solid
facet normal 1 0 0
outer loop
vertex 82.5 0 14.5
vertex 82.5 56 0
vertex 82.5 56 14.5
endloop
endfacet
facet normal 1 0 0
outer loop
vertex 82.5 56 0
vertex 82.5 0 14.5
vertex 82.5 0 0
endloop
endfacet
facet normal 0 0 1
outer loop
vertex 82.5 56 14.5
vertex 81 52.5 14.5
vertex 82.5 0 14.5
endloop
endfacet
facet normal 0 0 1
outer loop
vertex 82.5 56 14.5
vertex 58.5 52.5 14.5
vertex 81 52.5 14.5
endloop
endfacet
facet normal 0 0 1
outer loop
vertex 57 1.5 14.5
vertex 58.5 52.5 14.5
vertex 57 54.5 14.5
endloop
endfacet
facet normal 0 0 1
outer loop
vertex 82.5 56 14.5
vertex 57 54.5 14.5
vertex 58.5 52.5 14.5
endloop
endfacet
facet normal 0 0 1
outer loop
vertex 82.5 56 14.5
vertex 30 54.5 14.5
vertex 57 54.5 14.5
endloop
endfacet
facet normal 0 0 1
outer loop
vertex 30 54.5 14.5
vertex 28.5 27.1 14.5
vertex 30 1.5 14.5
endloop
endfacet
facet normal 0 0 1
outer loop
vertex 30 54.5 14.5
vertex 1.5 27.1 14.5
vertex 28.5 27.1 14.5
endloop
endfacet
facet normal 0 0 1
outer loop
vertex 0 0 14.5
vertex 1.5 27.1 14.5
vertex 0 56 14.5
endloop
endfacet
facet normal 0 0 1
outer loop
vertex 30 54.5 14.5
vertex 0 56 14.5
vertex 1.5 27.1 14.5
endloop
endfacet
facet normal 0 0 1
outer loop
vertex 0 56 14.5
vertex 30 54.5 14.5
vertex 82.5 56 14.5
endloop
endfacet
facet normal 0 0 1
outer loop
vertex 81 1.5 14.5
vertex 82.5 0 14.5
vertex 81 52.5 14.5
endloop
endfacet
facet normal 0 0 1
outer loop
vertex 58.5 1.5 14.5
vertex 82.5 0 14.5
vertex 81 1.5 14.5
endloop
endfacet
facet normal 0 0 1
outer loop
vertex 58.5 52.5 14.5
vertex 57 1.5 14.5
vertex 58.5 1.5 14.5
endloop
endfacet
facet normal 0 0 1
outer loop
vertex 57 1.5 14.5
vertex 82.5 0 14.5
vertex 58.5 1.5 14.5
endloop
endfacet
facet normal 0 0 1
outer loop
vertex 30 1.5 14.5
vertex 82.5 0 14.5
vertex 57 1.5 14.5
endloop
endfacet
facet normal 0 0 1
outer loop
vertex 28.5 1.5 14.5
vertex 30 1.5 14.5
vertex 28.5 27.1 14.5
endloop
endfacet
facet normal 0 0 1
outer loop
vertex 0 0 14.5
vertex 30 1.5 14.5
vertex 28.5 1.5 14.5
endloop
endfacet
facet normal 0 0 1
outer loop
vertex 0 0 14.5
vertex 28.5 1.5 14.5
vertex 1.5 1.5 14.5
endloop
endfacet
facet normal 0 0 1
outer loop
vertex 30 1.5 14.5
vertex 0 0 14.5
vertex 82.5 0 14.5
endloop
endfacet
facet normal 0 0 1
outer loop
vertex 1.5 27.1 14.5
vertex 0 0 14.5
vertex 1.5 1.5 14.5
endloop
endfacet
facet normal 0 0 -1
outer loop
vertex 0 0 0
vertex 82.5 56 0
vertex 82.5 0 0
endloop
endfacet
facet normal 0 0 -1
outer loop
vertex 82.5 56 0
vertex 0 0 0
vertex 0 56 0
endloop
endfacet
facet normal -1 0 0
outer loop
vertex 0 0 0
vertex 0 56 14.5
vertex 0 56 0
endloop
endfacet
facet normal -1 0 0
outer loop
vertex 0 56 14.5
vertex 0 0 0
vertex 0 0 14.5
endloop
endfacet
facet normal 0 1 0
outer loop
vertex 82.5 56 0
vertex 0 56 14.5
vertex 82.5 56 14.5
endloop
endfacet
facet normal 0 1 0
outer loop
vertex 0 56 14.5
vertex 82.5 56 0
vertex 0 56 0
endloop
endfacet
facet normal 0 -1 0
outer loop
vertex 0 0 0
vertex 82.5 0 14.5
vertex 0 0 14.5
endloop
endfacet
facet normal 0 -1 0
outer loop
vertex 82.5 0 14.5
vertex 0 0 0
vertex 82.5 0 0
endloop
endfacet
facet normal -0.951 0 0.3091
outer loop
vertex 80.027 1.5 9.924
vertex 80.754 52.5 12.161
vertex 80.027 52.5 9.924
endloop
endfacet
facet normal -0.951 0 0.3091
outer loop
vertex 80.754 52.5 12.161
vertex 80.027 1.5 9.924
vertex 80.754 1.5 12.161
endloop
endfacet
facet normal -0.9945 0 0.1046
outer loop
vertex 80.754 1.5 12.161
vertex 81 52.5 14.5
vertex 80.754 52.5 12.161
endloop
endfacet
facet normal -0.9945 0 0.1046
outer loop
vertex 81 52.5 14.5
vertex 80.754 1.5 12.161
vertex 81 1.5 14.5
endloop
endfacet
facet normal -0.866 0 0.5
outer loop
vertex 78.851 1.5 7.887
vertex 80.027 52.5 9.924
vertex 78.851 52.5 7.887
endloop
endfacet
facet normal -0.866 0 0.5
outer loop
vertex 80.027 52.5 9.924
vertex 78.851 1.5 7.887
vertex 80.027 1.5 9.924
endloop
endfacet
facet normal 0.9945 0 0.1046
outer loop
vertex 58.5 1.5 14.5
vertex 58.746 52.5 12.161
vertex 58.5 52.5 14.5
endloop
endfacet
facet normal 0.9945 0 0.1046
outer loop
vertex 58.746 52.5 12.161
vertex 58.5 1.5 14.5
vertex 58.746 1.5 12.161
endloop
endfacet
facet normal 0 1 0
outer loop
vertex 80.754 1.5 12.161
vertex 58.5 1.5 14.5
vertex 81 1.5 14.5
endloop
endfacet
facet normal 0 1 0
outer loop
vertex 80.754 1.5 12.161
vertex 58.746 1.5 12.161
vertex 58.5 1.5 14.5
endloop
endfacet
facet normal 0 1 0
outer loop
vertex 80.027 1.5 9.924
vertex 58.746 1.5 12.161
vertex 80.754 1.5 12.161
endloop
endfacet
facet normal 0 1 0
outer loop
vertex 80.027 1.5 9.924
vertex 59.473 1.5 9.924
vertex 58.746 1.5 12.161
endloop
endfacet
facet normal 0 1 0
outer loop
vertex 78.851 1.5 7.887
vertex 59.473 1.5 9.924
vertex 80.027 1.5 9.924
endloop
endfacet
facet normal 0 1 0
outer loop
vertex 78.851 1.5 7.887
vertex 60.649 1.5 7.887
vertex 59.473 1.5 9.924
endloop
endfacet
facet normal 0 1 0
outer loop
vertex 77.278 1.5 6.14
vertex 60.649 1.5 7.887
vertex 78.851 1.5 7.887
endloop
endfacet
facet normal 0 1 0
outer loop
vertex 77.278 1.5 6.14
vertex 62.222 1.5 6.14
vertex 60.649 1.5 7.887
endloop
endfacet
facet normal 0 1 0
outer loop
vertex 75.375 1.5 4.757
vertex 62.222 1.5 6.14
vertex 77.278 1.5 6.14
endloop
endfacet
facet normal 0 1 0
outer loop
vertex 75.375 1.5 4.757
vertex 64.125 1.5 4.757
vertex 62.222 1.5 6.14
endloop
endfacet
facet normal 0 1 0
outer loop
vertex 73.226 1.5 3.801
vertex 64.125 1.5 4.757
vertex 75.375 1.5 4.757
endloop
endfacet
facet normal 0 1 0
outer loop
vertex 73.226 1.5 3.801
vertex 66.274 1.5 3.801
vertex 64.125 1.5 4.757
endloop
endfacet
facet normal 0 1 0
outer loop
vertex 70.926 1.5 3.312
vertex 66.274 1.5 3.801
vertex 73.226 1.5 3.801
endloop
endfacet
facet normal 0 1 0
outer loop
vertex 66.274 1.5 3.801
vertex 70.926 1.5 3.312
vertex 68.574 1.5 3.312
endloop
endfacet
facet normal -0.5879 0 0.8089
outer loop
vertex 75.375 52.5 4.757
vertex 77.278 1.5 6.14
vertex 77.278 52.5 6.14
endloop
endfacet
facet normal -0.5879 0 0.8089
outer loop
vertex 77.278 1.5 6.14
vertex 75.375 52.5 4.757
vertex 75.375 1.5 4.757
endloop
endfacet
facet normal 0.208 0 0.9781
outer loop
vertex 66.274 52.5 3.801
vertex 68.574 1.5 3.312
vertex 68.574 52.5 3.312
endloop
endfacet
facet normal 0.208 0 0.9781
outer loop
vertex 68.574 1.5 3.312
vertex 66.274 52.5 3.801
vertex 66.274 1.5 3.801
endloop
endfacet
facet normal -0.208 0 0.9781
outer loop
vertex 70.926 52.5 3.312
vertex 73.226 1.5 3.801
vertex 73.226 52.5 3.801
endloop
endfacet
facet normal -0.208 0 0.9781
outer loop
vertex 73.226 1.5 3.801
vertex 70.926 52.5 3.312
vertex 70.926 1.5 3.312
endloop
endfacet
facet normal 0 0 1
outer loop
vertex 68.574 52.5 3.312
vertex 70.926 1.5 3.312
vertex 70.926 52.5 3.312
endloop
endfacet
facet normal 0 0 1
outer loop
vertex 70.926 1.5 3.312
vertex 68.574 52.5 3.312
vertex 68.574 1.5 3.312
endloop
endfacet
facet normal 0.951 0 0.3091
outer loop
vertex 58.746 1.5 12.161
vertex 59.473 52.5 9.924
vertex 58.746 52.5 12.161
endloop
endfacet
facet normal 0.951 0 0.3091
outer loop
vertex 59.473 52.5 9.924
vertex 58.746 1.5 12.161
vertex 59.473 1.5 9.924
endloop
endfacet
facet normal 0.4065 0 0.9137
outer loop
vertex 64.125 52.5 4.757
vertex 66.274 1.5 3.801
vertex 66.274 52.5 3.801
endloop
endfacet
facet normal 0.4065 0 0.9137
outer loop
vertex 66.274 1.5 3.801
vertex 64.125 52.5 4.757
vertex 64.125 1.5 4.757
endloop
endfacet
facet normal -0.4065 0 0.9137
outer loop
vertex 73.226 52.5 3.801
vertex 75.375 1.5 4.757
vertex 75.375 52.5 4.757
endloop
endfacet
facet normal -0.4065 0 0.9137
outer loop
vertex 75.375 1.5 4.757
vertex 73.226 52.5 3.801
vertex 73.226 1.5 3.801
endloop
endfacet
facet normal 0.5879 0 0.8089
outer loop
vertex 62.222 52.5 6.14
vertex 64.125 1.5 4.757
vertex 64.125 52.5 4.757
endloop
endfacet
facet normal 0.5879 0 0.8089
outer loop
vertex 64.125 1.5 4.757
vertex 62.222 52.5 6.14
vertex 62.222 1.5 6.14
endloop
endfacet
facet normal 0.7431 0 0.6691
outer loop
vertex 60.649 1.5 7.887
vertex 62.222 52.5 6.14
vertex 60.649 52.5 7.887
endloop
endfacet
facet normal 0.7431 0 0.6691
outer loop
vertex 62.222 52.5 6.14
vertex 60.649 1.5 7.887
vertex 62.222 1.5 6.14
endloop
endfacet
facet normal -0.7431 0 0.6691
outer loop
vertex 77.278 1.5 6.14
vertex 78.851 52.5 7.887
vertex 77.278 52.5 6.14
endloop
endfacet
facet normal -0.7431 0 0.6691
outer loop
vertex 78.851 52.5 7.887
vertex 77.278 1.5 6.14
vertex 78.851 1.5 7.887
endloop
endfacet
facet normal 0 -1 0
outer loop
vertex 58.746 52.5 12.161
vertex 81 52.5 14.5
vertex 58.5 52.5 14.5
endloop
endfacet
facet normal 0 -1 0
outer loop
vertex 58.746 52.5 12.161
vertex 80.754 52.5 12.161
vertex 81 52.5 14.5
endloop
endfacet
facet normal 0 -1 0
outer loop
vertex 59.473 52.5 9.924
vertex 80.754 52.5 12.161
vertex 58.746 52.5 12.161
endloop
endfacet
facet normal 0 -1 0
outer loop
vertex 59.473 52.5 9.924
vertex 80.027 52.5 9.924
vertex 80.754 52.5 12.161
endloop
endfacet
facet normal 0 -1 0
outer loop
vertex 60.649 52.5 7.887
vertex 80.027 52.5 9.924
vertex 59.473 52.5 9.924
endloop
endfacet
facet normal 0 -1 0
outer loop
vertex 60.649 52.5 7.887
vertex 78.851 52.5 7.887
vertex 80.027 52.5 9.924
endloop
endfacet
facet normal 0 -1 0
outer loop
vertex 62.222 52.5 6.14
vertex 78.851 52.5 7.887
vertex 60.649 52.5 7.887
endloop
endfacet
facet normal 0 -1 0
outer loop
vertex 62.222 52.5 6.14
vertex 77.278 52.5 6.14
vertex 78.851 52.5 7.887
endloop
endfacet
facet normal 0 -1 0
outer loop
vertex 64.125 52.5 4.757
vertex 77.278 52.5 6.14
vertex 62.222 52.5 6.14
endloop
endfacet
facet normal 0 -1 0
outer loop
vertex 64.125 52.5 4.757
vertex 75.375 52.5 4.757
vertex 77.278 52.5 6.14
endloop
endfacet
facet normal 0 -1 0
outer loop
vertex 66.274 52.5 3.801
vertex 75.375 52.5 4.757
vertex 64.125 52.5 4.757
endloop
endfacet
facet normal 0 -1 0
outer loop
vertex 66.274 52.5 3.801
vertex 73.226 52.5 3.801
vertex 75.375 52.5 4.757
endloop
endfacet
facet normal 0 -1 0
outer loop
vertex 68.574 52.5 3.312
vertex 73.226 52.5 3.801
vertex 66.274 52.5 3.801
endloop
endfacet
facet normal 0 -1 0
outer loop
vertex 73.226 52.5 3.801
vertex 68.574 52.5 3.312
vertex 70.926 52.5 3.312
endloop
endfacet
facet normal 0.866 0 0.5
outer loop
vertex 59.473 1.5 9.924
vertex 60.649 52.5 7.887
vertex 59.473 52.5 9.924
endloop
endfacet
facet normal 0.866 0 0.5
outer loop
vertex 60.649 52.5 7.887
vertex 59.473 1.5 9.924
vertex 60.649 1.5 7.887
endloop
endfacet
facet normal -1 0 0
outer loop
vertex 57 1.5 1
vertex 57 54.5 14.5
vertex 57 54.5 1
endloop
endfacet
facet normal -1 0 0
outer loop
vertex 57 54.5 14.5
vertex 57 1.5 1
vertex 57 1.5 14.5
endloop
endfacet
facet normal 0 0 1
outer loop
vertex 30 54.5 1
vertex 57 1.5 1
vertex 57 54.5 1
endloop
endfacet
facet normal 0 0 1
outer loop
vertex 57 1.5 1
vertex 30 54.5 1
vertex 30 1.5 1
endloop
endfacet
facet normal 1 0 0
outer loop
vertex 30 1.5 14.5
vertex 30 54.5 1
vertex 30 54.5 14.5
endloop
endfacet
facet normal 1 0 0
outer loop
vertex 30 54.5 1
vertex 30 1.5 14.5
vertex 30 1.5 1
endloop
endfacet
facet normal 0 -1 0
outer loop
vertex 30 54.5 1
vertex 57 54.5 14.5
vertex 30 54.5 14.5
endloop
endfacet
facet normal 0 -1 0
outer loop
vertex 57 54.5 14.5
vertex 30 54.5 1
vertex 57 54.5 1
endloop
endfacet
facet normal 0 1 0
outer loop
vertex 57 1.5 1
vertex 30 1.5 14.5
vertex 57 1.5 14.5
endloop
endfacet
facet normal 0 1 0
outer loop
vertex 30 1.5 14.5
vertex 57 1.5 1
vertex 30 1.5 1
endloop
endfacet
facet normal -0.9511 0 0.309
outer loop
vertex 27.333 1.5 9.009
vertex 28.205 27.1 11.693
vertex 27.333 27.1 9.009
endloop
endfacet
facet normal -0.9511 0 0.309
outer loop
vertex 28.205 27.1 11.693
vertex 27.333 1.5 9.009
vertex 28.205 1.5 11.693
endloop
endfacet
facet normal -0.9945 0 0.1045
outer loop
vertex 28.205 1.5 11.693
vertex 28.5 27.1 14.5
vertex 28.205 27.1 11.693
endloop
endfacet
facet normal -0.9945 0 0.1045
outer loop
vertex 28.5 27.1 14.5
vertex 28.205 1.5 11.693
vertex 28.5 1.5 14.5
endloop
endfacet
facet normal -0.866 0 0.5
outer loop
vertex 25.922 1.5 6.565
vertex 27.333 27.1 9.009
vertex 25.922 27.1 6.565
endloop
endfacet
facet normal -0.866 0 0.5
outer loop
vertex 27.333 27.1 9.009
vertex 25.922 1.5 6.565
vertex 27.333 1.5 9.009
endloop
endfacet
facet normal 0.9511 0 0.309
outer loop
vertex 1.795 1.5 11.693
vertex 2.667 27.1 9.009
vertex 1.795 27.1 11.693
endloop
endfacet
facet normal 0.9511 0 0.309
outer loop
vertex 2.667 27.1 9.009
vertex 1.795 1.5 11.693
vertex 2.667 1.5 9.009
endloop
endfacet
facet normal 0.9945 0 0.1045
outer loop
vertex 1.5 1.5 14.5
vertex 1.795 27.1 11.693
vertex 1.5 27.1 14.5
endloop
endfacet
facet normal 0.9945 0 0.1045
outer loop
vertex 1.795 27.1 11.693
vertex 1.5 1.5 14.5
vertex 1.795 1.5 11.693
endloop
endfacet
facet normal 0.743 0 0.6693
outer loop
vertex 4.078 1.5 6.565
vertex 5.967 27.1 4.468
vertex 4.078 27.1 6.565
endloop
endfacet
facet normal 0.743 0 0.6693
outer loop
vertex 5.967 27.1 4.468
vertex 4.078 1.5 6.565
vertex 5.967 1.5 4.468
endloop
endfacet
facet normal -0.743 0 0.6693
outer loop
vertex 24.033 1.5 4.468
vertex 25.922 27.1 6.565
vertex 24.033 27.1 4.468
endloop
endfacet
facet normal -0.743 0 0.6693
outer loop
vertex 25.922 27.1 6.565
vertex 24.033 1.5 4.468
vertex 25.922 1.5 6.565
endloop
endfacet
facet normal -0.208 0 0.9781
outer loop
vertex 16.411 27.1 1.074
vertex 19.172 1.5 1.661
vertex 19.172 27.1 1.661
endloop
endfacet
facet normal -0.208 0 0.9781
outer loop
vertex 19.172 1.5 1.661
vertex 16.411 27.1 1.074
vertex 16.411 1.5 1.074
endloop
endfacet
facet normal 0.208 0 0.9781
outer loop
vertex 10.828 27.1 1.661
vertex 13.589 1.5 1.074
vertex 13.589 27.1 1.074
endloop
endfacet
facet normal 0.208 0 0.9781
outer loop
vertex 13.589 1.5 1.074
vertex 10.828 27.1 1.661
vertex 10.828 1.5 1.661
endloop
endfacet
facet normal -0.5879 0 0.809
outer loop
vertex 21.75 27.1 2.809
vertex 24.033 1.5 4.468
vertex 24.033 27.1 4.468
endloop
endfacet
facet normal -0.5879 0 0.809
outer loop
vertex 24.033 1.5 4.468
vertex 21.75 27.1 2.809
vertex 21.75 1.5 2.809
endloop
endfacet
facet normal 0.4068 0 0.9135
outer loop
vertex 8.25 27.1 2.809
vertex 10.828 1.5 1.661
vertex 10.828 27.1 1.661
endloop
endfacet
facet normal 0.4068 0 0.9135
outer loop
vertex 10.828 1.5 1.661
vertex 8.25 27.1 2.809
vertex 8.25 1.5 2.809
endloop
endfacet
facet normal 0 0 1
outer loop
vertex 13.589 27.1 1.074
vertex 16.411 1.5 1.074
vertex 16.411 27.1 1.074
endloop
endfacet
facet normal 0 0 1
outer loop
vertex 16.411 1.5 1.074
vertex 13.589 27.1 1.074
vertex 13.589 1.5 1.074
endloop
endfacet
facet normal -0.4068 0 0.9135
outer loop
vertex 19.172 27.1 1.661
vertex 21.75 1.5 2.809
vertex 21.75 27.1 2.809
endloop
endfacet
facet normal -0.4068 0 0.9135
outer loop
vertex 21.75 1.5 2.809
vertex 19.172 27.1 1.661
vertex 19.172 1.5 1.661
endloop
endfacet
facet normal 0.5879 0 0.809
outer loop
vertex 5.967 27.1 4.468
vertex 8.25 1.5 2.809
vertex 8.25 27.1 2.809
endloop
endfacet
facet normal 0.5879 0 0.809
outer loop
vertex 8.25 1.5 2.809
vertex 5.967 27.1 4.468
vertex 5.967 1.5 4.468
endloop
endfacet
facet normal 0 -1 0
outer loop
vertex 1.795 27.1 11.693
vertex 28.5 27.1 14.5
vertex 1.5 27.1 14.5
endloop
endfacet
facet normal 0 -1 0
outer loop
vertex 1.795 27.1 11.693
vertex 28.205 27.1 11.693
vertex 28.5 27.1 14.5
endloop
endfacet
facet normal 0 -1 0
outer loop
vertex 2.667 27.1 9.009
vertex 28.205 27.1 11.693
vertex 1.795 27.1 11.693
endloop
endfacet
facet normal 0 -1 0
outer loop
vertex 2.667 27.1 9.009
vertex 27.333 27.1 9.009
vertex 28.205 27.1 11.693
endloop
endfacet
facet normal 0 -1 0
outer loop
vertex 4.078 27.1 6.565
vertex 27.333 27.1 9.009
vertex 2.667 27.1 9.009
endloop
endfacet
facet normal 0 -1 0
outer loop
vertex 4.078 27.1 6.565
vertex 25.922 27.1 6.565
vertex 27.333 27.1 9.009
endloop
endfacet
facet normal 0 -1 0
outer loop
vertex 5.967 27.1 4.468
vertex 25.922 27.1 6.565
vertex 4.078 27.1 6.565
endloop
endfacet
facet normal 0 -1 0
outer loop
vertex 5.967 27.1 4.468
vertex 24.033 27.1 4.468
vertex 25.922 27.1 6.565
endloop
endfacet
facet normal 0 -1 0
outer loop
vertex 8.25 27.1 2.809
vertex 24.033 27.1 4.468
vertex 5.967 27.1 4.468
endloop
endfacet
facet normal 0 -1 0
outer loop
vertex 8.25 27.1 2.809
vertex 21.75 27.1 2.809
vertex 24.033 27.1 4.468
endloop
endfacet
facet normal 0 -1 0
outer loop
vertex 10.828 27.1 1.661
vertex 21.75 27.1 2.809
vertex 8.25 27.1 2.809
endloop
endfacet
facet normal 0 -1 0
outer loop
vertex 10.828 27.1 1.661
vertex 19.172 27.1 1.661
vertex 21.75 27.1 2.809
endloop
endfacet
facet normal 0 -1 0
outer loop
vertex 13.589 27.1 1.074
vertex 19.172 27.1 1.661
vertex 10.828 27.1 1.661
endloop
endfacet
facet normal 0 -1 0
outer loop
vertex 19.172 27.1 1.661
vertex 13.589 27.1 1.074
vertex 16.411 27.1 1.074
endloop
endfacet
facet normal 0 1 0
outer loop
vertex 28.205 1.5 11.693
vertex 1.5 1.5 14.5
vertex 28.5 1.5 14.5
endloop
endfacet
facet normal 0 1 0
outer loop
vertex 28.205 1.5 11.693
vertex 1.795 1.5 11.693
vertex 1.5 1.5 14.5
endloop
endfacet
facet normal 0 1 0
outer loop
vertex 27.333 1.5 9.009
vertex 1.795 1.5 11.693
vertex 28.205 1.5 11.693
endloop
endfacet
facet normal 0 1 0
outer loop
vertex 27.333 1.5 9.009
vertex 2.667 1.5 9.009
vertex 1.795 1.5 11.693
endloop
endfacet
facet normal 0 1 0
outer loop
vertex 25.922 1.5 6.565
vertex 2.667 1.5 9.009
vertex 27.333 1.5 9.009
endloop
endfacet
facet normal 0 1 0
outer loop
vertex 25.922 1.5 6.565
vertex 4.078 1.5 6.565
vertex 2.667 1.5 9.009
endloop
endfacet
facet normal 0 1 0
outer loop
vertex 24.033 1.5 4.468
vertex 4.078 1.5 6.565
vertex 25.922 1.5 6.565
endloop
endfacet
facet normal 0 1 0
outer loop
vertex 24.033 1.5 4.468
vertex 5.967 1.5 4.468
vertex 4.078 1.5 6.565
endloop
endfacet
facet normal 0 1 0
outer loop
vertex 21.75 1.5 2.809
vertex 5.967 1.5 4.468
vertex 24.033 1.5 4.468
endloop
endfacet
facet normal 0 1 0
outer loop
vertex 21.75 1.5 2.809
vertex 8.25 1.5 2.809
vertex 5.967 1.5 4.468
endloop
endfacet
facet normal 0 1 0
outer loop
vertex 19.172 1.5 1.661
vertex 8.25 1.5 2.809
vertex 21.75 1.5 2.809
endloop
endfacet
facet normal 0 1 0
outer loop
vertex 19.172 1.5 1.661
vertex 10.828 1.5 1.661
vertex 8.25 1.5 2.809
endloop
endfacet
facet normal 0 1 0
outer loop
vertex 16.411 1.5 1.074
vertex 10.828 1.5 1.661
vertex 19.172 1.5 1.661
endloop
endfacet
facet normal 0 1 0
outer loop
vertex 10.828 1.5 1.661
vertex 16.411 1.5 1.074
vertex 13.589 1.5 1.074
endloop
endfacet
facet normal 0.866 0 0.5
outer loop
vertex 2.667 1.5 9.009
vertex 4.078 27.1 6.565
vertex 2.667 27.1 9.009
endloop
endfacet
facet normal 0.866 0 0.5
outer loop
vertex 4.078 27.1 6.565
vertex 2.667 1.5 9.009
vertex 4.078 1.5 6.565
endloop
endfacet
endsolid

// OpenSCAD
// file: consts.scad
$fs = 0.5;

FLOOR = 1;
WALL = 1.5;
THIN_WALL = 0.6;

SQUARE_TILE = 27; // 25.46mm
TILE_THICK = 3; // 2.18

RESOURCE_STACK = 53; // 51.43mm, 32 tokens

CUBE = 9; // 8.6mm

VOTING_TRIANGLE = 29; // 27.44mm
VOTING_STACK = 28; // 26.17, 12 tokens

// Discs
CLAIM_DIA = 13; // 11.83
CLAIM_H = 4; //3.78
CLAIM_STACK = 58; // 55.58

// TOKEN_STACK = 21; // 19.56, 9 tokens
TOKEN_STACK = 14; // 13.02, 6 square tokens

// Cubes
DELIVERY_STACK_D = 58; //55.71
DELIVERY_STACK_W = 18; //16.30
DELIVERY_STACK_H = DELIVERY_STACK_W;

MEEPLE_W = 17; //16.30
MEEPLE_H = 21; //20.23
MEEPLE_STACK = 30.5; //29.01

MONEY_1_DIA = 22.5; //21.22
MONEY_1_STACK = 51; // 49.60
MONEY_3_DIA = 27; //25.64
MONEY_3_STACK = 25.6; //23.97

ROAD_STACK = 53; //51.43

TOKEN_BOX_W = DELIVERY_STACK_W + MEEPLE_W + CLAIM_DIA + WALL * 4;
TOKEN_BOX_D = max(DELIVERY_STACK_D, SQUARE_TILE + WALL + MEEPLE_STACK, CLAIM_STACK) + WALL*2;
TOKEN_BOX_H = DELIVERY_STACK_H + FLOOR - CUBE/2;

BANK_BOX_W = MONEY_1_DIA + MONEY_3_DIA + SQUARE_TILE + WALL*4;
BANK_BOX_D = max(MONEY_1_STACK, MONEY_3_STACK, ROAD_STACK) + WALL*2;
BANK_BOX_H = max(MONEY_1_DIA, MONEY_3_DIA, SQUARE_TILE)/2 + FLOOR;

CARD_W = 65; // 63.42
CARD_H = 91; // 89.37

CARD_STACK_INCOME = 1.5; // 0.62, 2 cards
CARD_STACK_ACTION = 2.5; // 1.54, 5 cards, 4 stacks of these
CARD_STACK_ADVISOR = 6.5; // 5.55, 18 cards
CARD_STACK_BUILDING = 7.5; // 6.52, 21 cards

CARD_BOX_W = WALL*2 + CARD_H;
CARD_BOX_D = WALL*3 + THIN_WALL*6 + CARD_STACK_INCOME + CARD_STACK_ACTION*4 + CARD_STACK_ADVISOR + CARD_STACK_BUILDING + max(SQUARE_TILE, VOTING_STACK);
CARD_BOX_H = CARD_W/2 + FLOOR;

CLIP_DIA = 7;
// main file
include <consts.scad>;



difference() {
    cube([BANK_BOX_W, BANK_BOX_D, BANK_BOX_H]);

    translate([WALL*3 + MONEY_3_DIA + SQUARE_TILE + MONEY_1_DIA/2, WALL, BANK_BOX_H]) rotate([-90, 00, 0]) cylinder(d=MONEY_1_DIA, h=MONEY_1_STACK);
    translate([WALL*2 + MONEY_3_DIA, WALL, BANK_BOX_H - SQUARE_TILE/2]) cube([SQUARE_TILE, ROAD_STACK, SQUARE_TILE]);
    translate([WALL + MONEY_3_DIA/2, WALL, BANK_BOX_H]) rotate([-90, 00, 0]) cylinder(d=MONEY_3_DIA, h=MONEY_3_STACK);
}
